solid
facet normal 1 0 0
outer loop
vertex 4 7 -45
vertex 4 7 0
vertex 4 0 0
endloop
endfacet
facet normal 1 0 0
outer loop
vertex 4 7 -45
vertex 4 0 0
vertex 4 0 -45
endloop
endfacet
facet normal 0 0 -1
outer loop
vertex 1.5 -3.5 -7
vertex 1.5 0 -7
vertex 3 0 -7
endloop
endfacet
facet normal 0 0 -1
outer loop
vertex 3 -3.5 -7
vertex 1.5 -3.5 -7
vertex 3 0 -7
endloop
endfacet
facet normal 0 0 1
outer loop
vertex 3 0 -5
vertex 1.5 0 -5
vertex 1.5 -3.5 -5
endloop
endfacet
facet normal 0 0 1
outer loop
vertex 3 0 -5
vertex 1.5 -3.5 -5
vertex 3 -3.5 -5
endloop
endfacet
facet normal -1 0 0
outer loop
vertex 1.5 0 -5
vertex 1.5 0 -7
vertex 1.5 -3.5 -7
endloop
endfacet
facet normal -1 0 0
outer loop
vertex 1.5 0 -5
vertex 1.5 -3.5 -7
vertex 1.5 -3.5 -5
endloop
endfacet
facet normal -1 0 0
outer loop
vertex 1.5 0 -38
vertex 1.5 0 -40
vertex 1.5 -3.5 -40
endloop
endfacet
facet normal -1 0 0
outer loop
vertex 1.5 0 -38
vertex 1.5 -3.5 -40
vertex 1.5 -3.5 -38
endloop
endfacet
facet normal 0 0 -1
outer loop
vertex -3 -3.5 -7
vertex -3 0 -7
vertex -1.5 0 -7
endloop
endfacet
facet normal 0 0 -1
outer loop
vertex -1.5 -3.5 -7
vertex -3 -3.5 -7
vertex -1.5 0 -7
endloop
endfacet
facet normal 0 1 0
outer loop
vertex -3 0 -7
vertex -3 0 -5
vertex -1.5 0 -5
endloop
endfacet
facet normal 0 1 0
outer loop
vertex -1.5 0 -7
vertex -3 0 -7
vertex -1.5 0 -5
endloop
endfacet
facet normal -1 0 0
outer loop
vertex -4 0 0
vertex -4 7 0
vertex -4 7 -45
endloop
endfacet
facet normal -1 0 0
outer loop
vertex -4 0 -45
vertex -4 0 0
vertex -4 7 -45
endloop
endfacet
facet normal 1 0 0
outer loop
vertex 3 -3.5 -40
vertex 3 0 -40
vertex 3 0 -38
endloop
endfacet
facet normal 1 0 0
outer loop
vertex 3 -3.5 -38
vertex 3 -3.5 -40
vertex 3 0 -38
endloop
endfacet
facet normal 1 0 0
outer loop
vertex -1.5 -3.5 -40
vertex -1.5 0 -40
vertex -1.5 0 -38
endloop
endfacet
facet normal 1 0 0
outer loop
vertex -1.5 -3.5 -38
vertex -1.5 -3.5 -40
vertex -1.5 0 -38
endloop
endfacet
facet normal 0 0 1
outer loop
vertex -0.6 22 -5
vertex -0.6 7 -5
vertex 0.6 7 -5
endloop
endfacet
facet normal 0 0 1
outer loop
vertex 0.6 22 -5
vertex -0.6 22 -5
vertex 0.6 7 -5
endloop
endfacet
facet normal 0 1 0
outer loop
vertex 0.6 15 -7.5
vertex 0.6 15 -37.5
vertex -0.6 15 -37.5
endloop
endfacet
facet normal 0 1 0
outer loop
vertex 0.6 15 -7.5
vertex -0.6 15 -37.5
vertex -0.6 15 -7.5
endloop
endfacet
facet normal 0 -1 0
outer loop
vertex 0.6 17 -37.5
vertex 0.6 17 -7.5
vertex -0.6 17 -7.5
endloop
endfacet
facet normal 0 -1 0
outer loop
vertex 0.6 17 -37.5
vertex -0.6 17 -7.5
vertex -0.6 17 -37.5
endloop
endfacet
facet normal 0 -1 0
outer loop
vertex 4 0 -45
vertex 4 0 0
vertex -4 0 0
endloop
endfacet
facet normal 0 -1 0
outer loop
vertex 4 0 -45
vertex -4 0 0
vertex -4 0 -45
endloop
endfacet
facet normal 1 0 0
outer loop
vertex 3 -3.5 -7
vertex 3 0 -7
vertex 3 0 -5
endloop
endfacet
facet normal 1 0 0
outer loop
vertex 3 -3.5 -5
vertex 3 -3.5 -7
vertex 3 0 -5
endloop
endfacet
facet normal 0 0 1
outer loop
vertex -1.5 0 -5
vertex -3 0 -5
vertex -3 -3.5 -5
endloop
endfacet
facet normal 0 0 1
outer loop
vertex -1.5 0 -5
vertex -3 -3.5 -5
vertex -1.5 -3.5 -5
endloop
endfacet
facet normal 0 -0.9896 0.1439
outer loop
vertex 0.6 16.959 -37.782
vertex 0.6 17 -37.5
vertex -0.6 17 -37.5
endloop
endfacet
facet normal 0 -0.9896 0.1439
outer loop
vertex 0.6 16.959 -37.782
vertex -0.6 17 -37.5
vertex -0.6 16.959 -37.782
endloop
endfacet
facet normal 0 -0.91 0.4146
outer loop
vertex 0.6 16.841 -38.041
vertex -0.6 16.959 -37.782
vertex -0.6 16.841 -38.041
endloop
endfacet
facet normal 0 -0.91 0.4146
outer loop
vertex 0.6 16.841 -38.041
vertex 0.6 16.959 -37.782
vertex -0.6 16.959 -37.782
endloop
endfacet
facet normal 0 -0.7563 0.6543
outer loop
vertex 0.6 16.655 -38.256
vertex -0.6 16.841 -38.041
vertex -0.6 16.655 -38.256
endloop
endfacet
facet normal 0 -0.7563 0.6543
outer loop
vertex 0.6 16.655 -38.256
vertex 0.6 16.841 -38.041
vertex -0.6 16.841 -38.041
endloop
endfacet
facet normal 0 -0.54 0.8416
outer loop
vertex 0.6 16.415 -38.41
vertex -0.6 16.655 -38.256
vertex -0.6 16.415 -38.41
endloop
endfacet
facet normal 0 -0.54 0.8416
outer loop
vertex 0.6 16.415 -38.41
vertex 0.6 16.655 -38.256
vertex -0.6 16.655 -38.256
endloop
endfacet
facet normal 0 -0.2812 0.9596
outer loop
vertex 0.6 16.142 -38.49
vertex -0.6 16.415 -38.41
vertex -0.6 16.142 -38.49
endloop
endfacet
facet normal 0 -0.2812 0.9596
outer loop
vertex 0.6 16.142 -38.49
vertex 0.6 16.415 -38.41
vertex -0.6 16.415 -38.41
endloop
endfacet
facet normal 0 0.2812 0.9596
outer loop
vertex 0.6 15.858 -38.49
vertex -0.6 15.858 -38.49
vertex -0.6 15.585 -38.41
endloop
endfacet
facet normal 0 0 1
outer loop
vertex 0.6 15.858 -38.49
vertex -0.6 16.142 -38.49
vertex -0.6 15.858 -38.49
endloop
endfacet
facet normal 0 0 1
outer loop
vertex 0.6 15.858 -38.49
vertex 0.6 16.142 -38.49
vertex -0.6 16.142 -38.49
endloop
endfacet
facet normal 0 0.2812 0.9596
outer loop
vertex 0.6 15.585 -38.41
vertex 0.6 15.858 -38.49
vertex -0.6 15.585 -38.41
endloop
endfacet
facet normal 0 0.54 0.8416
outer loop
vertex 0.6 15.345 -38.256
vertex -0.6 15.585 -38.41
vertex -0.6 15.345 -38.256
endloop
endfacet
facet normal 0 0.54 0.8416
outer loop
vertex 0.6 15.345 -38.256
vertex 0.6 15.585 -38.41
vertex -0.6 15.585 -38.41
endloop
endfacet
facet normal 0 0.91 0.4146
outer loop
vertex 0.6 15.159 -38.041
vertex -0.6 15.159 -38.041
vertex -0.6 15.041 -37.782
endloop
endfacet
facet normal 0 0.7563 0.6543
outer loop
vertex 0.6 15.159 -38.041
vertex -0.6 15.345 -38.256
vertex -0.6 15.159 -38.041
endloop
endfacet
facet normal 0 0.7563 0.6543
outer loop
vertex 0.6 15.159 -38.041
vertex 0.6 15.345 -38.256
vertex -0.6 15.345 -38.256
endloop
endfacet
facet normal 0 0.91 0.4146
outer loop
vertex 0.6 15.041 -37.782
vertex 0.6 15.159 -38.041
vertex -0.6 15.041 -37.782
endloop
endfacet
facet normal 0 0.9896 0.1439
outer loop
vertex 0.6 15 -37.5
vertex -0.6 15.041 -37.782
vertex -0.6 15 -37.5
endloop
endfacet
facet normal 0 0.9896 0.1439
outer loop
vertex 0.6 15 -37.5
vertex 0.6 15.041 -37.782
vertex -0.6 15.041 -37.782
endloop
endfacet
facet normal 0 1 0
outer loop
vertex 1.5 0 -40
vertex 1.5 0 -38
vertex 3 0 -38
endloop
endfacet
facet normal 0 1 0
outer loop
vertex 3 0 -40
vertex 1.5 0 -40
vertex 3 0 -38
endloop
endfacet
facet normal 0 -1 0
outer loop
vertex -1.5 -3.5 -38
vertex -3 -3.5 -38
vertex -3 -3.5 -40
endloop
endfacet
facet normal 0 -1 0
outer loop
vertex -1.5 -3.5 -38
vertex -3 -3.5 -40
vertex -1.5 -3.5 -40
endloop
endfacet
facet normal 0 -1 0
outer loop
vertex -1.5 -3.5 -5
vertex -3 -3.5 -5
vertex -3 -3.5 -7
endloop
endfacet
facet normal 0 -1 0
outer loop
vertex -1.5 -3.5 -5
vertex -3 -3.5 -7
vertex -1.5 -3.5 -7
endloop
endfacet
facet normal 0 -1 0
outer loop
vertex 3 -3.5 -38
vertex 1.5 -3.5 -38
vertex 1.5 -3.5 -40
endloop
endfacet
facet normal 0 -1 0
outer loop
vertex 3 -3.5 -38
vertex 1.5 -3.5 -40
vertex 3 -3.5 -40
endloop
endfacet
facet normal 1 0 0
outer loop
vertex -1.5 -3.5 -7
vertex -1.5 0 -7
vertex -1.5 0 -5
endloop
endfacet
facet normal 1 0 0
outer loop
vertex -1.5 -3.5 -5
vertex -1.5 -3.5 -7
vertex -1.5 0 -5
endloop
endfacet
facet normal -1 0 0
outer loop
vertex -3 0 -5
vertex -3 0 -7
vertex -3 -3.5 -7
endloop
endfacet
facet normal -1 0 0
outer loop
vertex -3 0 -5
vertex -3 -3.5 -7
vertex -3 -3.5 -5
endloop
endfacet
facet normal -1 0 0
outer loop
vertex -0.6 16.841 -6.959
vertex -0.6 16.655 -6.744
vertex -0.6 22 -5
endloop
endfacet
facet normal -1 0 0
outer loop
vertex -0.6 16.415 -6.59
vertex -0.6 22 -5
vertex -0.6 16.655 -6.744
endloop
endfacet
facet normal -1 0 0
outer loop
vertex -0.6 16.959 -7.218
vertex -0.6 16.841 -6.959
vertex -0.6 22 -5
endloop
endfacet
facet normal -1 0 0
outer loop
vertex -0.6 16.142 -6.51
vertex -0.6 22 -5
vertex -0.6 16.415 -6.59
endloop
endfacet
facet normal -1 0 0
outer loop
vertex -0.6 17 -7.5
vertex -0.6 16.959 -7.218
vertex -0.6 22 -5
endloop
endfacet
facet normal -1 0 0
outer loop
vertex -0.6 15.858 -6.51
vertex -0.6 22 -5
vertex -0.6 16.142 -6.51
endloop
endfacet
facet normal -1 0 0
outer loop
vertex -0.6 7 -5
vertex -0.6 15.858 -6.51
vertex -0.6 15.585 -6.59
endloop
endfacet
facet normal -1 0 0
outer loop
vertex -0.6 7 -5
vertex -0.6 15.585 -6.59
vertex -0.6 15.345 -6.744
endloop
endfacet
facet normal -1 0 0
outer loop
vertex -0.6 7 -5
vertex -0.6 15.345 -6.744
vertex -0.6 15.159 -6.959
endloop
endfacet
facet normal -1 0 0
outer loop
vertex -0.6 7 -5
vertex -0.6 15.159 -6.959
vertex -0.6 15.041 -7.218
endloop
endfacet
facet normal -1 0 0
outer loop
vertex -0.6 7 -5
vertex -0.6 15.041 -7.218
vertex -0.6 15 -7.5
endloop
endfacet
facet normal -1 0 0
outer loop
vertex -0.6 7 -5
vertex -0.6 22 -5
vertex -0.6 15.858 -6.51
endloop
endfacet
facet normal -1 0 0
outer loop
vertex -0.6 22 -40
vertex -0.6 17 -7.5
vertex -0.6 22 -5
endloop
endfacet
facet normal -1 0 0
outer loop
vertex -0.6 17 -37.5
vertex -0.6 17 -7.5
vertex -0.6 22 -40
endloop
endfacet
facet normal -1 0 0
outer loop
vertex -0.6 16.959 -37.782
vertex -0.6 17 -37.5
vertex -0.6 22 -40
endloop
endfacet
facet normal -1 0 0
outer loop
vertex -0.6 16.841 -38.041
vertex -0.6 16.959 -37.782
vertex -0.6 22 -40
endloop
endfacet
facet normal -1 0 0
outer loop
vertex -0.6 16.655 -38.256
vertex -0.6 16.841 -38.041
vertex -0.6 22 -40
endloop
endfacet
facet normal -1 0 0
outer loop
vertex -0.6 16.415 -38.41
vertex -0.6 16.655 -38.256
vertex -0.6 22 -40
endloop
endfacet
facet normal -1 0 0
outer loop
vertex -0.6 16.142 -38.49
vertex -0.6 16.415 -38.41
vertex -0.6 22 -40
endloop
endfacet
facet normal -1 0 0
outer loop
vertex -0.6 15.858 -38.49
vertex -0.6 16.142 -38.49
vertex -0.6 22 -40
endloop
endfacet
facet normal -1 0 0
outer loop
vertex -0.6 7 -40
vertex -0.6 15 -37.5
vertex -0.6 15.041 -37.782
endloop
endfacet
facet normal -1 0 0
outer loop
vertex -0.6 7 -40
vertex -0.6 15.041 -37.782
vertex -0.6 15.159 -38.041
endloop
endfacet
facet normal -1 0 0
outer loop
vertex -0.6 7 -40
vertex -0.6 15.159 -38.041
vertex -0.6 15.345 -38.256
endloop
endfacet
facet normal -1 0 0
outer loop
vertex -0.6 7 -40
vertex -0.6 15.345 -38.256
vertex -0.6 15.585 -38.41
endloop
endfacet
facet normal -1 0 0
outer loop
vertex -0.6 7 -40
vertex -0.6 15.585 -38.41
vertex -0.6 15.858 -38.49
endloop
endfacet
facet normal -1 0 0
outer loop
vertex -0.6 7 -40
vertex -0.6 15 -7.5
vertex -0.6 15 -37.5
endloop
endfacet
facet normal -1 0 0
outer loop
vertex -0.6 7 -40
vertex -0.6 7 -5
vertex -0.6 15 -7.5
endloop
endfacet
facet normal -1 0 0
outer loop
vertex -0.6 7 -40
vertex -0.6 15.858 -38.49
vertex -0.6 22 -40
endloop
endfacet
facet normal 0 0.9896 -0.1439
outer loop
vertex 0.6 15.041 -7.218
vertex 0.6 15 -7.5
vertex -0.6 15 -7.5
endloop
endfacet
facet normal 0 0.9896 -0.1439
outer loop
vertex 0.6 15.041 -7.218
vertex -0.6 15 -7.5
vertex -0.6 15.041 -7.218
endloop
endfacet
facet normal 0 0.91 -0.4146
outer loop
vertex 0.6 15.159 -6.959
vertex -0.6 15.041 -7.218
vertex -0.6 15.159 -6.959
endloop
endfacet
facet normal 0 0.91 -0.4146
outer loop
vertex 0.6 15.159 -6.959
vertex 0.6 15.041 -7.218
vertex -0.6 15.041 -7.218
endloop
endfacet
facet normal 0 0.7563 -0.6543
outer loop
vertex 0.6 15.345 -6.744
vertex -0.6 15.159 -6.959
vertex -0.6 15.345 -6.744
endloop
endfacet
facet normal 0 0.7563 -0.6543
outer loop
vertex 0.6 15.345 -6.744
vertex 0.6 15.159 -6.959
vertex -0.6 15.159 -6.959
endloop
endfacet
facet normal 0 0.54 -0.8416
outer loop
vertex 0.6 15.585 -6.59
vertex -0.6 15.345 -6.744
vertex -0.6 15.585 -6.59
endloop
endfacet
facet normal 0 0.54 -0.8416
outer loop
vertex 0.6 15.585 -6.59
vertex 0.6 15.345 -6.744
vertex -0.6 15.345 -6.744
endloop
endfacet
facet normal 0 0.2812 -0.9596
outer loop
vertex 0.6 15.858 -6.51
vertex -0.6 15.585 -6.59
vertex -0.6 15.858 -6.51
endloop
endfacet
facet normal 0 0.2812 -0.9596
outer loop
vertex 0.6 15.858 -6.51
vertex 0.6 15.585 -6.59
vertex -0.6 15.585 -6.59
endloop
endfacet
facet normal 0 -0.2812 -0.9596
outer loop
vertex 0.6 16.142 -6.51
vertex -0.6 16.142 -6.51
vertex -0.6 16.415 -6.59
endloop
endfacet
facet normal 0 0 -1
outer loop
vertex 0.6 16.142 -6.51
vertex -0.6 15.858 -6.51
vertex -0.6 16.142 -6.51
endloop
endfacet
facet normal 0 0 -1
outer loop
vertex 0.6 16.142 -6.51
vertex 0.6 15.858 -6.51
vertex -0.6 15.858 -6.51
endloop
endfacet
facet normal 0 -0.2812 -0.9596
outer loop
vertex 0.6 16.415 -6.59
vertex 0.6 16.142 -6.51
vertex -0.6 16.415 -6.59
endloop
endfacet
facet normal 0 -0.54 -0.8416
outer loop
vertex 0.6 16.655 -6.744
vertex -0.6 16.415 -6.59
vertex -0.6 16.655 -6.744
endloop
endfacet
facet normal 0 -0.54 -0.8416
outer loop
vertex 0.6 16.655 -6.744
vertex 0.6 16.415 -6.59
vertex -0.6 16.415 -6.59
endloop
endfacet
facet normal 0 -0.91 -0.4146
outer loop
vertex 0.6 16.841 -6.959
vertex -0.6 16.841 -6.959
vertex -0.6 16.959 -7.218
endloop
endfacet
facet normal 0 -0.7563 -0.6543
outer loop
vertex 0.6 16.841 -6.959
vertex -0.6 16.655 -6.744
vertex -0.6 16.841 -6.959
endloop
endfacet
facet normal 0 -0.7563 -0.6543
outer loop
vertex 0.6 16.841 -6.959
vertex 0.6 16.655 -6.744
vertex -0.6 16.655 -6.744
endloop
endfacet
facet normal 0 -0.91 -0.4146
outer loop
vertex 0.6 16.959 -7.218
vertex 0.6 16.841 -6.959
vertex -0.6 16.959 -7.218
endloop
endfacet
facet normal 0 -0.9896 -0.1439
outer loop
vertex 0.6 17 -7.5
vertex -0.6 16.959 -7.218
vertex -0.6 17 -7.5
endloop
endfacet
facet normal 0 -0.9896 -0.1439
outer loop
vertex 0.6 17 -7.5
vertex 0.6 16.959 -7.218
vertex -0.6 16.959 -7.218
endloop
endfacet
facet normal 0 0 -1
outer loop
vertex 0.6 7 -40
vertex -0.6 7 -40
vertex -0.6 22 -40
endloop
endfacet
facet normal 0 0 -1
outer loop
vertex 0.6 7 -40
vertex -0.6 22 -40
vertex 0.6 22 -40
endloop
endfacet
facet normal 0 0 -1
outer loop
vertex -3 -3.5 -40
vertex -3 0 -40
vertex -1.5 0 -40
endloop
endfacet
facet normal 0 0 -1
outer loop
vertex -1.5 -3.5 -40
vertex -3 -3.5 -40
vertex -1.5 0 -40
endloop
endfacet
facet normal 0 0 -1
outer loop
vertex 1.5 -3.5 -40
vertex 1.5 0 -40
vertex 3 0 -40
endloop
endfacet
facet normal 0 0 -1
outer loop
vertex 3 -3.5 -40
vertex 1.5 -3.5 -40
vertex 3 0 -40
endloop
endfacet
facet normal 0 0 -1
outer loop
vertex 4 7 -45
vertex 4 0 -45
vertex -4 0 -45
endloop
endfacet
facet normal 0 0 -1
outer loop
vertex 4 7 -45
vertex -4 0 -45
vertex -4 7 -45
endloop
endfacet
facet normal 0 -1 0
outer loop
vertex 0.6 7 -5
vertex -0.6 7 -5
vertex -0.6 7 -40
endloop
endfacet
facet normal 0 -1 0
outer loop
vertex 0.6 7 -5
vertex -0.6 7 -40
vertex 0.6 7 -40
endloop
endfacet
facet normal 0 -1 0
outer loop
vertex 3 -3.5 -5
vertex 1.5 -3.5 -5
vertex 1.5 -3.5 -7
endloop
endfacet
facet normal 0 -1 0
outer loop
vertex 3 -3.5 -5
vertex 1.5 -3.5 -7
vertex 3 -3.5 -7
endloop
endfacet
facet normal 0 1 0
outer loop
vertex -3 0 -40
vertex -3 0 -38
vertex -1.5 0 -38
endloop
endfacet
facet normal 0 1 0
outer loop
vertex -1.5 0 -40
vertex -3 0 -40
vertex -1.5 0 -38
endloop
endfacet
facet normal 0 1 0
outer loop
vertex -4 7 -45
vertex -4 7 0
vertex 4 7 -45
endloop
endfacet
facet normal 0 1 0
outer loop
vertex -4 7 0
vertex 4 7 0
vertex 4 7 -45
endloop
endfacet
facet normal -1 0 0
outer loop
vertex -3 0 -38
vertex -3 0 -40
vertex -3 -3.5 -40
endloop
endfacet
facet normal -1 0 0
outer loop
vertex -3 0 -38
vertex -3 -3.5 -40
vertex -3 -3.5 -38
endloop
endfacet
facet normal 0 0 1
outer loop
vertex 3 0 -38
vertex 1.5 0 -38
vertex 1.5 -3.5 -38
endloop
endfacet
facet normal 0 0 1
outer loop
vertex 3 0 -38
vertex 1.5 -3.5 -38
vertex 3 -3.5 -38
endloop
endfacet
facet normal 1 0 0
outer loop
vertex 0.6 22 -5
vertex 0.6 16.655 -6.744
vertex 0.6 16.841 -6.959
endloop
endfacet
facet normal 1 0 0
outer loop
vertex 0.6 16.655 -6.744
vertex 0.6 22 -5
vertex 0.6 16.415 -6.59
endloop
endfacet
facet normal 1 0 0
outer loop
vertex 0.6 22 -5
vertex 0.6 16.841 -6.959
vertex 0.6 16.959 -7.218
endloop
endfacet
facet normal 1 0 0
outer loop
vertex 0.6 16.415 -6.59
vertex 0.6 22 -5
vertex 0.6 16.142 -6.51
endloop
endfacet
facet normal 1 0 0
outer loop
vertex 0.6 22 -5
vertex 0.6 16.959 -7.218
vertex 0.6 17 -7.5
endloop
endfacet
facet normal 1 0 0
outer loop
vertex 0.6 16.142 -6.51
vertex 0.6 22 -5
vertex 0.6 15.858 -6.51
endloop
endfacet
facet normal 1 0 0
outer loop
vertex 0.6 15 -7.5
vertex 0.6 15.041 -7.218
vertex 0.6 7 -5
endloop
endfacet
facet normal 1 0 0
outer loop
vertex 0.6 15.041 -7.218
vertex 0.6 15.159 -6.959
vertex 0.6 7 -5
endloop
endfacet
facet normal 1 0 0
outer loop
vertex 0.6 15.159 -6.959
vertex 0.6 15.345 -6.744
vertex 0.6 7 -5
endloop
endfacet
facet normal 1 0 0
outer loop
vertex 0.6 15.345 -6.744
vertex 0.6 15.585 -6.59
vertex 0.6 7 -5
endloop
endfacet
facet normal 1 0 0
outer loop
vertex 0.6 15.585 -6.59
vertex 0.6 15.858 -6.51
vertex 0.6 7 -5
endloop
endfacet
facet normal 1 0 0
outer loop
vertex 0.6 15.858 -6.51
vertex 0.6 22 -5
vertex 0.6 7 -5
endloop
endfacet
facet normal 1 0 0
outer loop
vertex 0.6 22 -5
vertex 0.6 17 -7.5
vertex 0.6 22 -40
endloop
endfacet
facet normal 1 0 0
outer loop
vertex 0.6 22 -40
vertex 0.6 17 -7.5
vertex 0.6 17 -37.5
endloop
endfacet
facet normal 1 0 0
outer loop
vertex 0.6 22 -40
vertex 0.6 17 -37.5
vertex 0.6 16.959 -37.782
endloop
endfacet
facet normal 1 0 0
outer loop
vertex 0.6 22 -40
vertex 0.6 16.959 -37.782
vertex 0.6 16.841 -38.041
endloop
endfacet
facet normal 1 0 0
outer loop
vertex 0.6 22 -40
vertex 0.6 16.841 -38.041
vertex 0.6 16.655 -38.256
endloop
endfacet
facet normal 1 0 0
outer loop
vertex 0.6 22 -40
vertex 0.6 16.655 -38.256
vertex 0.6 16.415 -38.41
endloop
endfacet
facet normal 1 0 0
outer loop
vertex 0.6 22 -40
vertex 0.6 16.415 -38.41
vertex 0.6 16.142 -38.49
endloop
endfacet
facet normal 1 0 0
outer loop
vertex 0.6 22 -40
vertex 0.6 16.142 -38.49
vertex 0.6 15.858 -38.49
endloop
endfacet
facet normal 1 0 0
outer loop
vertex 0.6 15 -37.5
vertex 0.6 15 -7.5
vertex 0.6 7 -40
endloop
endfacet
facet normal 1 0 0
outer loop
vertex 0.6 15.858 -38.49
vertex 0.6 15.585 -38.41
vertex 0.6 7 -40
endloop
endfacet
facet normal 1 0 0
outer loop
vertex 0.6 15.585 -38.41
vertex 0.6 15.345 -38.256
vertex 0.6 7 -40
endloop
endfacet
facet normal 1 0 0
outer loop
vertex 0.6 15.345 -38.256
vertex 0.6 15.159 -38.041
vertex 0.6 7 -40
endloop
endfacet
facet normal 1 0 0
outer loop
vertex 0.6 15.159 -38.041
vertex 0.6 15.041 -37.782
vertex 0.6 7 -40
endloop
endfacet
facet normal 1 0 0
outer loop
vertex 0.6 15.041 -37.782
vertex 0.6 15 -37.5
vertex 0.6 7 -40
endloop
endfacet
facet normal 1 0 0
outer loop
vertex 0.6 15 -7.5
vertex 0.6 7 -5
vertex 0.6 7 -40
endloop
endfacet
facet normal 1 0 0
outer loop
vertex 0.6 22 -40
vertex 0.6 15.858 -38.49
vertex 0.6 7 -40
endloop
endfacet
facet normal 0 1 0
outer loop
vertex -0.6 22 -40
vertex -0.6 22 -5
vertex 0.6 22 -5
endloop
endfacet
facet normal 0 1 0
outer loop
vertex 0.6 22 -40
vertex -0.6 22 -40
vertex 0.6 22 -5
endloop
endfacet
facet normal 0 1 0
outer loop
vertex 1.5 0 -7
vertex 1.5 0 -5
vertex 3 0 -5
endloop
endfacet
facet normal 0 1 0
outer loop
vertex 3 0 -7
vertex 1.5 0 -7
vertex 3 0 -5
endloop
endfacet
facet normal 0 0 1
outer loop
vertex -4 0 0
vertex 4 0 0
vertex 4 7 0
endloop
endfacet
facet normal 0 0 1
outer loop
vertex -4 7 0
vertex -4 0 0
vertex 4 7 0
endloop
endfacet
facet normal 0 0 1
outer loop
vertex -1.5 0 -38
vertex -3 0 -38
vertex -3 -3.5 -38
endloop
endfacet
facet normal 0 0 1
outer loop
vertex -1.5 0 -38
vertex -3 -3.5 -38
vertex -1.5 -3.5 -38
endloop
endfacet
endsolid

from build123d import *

# Parameters (mm, degrees)
SKETCH1_W             = 45
SKETCH1_H             = 7
BOSS_EXTRUDE1_DEPTH   = 4
SKETCH2_W             = 1.2
SKETCH2_H             = 35
BOSS_EXTRUDE2_DEPTH   = 15
SKETCH3_W             = 1.5
SKETCH3_H             = 2
BOSS_EXTRUDE3_DEPTH   = 3.5
BOSS_EXTRUDE3_2_DEPTH = 3.5
BOSS_EXTRUDE3_3_DEPTH = 3.5
BOSS_EXTRUDE3_4_DEPTH = 3.5
CUT_EXTRUDE1_DEPTH    = 10


with BuildPart() as part:
    # Sketch1 → Boss-Extrude1 (new, symmetric)
    with BuildSketch(Plane(origin=(0, 0, 0), x_dir=(0, 0, -1), z_dir=(1, 0, 0))):
        with Locations((22.5, 3.5)):
            Rectangle(SKETCH1_W, SKETCH1_H)
    extrude(amount=BOSS_EXTRUDE1_DEPTH, both=True)


with BuildPart() as body_2:
    # Sketch2 → Boss-Extrude2 (new body)
    with BuildSketch(Plane(origin=(0, 7, 0), x_dir=(1, 0, 0), z_dir=(0, 1, 0))):
        with Locations((0, 22.5)):
            Rectangle(SKETCH2_W, SKETCH2_H)
    extrude(amount=BOSS_EXTRUDE2_DEPTH)

    # Sketch4 → Cut-Extrude1 (cut)
    with BuildSketch(Plane(origin=(0.6, 0, 0), x_dir=(0, 0, -1), z_dir=(1, 0, 0))):
        with BuildLine():
            Line((7.5, 17), (37.5, 17))
            ThreePointArc((37.5, 17), (38.5, 16), (37.5, 15))
            Line((37.5, 15), (7.5, 15))
            ThreePointArc((7.5, 15), (6.5, 16), (7.5, 17))
        make_face()
    extrude(amount=-CUT_EXTRUDE1_DEPTH, mode=Mode.SUBTRACT)


with BuildPart() as body_3:
    # Sketch3 → Boss-Extrude3 (new body)
    with BuildSketch(Plane.XZ):
        with Locations((-2.25, -6)):
            Rectangle(SKETCH3_W, SKETCH3_H)
    extrude(amount=BOSS_EXTRUDE3_DEPTH)


with BuildPart() as body_4:
    # Sketch3 → Boss-Extrude3 2 (new body)
    with BuildSketch(Plane.XZ):
        with Locations((2.25, -6)):
            Rectangle(SKETCH3_W, SKETCH3_H)
    extrude(amount=BOSS_EXTRUDE3_2_DEPTH)


with BuildPart() as body_5:
    # Sketch3 → Boss-Extrude3 3 (new body)
    with BuildSketch(Plane.XZ):
        with Locations((2.25, -39)):
            Rectangle(SKETCH3_W, SKETCH3_H)
    extrude(amount=BOSS_EXTRUDE3_3_DEPTH)


with BuildPart() as body_6:
    # Sketch3 → Boss-Extrude3 4 (new body)
    with BuildSketch(Plane.XZ):
        with Locations((-2.25, -39)):
            Rectangle(SKETCH3_W, SKETCH3_H)
    extrude(amount=BOSS_EXTRUDE3_4_DEPTH)


solid = Compound([part.part, body_2.part, body_3.part, body_4.part, body_5.part, body_6.part])
